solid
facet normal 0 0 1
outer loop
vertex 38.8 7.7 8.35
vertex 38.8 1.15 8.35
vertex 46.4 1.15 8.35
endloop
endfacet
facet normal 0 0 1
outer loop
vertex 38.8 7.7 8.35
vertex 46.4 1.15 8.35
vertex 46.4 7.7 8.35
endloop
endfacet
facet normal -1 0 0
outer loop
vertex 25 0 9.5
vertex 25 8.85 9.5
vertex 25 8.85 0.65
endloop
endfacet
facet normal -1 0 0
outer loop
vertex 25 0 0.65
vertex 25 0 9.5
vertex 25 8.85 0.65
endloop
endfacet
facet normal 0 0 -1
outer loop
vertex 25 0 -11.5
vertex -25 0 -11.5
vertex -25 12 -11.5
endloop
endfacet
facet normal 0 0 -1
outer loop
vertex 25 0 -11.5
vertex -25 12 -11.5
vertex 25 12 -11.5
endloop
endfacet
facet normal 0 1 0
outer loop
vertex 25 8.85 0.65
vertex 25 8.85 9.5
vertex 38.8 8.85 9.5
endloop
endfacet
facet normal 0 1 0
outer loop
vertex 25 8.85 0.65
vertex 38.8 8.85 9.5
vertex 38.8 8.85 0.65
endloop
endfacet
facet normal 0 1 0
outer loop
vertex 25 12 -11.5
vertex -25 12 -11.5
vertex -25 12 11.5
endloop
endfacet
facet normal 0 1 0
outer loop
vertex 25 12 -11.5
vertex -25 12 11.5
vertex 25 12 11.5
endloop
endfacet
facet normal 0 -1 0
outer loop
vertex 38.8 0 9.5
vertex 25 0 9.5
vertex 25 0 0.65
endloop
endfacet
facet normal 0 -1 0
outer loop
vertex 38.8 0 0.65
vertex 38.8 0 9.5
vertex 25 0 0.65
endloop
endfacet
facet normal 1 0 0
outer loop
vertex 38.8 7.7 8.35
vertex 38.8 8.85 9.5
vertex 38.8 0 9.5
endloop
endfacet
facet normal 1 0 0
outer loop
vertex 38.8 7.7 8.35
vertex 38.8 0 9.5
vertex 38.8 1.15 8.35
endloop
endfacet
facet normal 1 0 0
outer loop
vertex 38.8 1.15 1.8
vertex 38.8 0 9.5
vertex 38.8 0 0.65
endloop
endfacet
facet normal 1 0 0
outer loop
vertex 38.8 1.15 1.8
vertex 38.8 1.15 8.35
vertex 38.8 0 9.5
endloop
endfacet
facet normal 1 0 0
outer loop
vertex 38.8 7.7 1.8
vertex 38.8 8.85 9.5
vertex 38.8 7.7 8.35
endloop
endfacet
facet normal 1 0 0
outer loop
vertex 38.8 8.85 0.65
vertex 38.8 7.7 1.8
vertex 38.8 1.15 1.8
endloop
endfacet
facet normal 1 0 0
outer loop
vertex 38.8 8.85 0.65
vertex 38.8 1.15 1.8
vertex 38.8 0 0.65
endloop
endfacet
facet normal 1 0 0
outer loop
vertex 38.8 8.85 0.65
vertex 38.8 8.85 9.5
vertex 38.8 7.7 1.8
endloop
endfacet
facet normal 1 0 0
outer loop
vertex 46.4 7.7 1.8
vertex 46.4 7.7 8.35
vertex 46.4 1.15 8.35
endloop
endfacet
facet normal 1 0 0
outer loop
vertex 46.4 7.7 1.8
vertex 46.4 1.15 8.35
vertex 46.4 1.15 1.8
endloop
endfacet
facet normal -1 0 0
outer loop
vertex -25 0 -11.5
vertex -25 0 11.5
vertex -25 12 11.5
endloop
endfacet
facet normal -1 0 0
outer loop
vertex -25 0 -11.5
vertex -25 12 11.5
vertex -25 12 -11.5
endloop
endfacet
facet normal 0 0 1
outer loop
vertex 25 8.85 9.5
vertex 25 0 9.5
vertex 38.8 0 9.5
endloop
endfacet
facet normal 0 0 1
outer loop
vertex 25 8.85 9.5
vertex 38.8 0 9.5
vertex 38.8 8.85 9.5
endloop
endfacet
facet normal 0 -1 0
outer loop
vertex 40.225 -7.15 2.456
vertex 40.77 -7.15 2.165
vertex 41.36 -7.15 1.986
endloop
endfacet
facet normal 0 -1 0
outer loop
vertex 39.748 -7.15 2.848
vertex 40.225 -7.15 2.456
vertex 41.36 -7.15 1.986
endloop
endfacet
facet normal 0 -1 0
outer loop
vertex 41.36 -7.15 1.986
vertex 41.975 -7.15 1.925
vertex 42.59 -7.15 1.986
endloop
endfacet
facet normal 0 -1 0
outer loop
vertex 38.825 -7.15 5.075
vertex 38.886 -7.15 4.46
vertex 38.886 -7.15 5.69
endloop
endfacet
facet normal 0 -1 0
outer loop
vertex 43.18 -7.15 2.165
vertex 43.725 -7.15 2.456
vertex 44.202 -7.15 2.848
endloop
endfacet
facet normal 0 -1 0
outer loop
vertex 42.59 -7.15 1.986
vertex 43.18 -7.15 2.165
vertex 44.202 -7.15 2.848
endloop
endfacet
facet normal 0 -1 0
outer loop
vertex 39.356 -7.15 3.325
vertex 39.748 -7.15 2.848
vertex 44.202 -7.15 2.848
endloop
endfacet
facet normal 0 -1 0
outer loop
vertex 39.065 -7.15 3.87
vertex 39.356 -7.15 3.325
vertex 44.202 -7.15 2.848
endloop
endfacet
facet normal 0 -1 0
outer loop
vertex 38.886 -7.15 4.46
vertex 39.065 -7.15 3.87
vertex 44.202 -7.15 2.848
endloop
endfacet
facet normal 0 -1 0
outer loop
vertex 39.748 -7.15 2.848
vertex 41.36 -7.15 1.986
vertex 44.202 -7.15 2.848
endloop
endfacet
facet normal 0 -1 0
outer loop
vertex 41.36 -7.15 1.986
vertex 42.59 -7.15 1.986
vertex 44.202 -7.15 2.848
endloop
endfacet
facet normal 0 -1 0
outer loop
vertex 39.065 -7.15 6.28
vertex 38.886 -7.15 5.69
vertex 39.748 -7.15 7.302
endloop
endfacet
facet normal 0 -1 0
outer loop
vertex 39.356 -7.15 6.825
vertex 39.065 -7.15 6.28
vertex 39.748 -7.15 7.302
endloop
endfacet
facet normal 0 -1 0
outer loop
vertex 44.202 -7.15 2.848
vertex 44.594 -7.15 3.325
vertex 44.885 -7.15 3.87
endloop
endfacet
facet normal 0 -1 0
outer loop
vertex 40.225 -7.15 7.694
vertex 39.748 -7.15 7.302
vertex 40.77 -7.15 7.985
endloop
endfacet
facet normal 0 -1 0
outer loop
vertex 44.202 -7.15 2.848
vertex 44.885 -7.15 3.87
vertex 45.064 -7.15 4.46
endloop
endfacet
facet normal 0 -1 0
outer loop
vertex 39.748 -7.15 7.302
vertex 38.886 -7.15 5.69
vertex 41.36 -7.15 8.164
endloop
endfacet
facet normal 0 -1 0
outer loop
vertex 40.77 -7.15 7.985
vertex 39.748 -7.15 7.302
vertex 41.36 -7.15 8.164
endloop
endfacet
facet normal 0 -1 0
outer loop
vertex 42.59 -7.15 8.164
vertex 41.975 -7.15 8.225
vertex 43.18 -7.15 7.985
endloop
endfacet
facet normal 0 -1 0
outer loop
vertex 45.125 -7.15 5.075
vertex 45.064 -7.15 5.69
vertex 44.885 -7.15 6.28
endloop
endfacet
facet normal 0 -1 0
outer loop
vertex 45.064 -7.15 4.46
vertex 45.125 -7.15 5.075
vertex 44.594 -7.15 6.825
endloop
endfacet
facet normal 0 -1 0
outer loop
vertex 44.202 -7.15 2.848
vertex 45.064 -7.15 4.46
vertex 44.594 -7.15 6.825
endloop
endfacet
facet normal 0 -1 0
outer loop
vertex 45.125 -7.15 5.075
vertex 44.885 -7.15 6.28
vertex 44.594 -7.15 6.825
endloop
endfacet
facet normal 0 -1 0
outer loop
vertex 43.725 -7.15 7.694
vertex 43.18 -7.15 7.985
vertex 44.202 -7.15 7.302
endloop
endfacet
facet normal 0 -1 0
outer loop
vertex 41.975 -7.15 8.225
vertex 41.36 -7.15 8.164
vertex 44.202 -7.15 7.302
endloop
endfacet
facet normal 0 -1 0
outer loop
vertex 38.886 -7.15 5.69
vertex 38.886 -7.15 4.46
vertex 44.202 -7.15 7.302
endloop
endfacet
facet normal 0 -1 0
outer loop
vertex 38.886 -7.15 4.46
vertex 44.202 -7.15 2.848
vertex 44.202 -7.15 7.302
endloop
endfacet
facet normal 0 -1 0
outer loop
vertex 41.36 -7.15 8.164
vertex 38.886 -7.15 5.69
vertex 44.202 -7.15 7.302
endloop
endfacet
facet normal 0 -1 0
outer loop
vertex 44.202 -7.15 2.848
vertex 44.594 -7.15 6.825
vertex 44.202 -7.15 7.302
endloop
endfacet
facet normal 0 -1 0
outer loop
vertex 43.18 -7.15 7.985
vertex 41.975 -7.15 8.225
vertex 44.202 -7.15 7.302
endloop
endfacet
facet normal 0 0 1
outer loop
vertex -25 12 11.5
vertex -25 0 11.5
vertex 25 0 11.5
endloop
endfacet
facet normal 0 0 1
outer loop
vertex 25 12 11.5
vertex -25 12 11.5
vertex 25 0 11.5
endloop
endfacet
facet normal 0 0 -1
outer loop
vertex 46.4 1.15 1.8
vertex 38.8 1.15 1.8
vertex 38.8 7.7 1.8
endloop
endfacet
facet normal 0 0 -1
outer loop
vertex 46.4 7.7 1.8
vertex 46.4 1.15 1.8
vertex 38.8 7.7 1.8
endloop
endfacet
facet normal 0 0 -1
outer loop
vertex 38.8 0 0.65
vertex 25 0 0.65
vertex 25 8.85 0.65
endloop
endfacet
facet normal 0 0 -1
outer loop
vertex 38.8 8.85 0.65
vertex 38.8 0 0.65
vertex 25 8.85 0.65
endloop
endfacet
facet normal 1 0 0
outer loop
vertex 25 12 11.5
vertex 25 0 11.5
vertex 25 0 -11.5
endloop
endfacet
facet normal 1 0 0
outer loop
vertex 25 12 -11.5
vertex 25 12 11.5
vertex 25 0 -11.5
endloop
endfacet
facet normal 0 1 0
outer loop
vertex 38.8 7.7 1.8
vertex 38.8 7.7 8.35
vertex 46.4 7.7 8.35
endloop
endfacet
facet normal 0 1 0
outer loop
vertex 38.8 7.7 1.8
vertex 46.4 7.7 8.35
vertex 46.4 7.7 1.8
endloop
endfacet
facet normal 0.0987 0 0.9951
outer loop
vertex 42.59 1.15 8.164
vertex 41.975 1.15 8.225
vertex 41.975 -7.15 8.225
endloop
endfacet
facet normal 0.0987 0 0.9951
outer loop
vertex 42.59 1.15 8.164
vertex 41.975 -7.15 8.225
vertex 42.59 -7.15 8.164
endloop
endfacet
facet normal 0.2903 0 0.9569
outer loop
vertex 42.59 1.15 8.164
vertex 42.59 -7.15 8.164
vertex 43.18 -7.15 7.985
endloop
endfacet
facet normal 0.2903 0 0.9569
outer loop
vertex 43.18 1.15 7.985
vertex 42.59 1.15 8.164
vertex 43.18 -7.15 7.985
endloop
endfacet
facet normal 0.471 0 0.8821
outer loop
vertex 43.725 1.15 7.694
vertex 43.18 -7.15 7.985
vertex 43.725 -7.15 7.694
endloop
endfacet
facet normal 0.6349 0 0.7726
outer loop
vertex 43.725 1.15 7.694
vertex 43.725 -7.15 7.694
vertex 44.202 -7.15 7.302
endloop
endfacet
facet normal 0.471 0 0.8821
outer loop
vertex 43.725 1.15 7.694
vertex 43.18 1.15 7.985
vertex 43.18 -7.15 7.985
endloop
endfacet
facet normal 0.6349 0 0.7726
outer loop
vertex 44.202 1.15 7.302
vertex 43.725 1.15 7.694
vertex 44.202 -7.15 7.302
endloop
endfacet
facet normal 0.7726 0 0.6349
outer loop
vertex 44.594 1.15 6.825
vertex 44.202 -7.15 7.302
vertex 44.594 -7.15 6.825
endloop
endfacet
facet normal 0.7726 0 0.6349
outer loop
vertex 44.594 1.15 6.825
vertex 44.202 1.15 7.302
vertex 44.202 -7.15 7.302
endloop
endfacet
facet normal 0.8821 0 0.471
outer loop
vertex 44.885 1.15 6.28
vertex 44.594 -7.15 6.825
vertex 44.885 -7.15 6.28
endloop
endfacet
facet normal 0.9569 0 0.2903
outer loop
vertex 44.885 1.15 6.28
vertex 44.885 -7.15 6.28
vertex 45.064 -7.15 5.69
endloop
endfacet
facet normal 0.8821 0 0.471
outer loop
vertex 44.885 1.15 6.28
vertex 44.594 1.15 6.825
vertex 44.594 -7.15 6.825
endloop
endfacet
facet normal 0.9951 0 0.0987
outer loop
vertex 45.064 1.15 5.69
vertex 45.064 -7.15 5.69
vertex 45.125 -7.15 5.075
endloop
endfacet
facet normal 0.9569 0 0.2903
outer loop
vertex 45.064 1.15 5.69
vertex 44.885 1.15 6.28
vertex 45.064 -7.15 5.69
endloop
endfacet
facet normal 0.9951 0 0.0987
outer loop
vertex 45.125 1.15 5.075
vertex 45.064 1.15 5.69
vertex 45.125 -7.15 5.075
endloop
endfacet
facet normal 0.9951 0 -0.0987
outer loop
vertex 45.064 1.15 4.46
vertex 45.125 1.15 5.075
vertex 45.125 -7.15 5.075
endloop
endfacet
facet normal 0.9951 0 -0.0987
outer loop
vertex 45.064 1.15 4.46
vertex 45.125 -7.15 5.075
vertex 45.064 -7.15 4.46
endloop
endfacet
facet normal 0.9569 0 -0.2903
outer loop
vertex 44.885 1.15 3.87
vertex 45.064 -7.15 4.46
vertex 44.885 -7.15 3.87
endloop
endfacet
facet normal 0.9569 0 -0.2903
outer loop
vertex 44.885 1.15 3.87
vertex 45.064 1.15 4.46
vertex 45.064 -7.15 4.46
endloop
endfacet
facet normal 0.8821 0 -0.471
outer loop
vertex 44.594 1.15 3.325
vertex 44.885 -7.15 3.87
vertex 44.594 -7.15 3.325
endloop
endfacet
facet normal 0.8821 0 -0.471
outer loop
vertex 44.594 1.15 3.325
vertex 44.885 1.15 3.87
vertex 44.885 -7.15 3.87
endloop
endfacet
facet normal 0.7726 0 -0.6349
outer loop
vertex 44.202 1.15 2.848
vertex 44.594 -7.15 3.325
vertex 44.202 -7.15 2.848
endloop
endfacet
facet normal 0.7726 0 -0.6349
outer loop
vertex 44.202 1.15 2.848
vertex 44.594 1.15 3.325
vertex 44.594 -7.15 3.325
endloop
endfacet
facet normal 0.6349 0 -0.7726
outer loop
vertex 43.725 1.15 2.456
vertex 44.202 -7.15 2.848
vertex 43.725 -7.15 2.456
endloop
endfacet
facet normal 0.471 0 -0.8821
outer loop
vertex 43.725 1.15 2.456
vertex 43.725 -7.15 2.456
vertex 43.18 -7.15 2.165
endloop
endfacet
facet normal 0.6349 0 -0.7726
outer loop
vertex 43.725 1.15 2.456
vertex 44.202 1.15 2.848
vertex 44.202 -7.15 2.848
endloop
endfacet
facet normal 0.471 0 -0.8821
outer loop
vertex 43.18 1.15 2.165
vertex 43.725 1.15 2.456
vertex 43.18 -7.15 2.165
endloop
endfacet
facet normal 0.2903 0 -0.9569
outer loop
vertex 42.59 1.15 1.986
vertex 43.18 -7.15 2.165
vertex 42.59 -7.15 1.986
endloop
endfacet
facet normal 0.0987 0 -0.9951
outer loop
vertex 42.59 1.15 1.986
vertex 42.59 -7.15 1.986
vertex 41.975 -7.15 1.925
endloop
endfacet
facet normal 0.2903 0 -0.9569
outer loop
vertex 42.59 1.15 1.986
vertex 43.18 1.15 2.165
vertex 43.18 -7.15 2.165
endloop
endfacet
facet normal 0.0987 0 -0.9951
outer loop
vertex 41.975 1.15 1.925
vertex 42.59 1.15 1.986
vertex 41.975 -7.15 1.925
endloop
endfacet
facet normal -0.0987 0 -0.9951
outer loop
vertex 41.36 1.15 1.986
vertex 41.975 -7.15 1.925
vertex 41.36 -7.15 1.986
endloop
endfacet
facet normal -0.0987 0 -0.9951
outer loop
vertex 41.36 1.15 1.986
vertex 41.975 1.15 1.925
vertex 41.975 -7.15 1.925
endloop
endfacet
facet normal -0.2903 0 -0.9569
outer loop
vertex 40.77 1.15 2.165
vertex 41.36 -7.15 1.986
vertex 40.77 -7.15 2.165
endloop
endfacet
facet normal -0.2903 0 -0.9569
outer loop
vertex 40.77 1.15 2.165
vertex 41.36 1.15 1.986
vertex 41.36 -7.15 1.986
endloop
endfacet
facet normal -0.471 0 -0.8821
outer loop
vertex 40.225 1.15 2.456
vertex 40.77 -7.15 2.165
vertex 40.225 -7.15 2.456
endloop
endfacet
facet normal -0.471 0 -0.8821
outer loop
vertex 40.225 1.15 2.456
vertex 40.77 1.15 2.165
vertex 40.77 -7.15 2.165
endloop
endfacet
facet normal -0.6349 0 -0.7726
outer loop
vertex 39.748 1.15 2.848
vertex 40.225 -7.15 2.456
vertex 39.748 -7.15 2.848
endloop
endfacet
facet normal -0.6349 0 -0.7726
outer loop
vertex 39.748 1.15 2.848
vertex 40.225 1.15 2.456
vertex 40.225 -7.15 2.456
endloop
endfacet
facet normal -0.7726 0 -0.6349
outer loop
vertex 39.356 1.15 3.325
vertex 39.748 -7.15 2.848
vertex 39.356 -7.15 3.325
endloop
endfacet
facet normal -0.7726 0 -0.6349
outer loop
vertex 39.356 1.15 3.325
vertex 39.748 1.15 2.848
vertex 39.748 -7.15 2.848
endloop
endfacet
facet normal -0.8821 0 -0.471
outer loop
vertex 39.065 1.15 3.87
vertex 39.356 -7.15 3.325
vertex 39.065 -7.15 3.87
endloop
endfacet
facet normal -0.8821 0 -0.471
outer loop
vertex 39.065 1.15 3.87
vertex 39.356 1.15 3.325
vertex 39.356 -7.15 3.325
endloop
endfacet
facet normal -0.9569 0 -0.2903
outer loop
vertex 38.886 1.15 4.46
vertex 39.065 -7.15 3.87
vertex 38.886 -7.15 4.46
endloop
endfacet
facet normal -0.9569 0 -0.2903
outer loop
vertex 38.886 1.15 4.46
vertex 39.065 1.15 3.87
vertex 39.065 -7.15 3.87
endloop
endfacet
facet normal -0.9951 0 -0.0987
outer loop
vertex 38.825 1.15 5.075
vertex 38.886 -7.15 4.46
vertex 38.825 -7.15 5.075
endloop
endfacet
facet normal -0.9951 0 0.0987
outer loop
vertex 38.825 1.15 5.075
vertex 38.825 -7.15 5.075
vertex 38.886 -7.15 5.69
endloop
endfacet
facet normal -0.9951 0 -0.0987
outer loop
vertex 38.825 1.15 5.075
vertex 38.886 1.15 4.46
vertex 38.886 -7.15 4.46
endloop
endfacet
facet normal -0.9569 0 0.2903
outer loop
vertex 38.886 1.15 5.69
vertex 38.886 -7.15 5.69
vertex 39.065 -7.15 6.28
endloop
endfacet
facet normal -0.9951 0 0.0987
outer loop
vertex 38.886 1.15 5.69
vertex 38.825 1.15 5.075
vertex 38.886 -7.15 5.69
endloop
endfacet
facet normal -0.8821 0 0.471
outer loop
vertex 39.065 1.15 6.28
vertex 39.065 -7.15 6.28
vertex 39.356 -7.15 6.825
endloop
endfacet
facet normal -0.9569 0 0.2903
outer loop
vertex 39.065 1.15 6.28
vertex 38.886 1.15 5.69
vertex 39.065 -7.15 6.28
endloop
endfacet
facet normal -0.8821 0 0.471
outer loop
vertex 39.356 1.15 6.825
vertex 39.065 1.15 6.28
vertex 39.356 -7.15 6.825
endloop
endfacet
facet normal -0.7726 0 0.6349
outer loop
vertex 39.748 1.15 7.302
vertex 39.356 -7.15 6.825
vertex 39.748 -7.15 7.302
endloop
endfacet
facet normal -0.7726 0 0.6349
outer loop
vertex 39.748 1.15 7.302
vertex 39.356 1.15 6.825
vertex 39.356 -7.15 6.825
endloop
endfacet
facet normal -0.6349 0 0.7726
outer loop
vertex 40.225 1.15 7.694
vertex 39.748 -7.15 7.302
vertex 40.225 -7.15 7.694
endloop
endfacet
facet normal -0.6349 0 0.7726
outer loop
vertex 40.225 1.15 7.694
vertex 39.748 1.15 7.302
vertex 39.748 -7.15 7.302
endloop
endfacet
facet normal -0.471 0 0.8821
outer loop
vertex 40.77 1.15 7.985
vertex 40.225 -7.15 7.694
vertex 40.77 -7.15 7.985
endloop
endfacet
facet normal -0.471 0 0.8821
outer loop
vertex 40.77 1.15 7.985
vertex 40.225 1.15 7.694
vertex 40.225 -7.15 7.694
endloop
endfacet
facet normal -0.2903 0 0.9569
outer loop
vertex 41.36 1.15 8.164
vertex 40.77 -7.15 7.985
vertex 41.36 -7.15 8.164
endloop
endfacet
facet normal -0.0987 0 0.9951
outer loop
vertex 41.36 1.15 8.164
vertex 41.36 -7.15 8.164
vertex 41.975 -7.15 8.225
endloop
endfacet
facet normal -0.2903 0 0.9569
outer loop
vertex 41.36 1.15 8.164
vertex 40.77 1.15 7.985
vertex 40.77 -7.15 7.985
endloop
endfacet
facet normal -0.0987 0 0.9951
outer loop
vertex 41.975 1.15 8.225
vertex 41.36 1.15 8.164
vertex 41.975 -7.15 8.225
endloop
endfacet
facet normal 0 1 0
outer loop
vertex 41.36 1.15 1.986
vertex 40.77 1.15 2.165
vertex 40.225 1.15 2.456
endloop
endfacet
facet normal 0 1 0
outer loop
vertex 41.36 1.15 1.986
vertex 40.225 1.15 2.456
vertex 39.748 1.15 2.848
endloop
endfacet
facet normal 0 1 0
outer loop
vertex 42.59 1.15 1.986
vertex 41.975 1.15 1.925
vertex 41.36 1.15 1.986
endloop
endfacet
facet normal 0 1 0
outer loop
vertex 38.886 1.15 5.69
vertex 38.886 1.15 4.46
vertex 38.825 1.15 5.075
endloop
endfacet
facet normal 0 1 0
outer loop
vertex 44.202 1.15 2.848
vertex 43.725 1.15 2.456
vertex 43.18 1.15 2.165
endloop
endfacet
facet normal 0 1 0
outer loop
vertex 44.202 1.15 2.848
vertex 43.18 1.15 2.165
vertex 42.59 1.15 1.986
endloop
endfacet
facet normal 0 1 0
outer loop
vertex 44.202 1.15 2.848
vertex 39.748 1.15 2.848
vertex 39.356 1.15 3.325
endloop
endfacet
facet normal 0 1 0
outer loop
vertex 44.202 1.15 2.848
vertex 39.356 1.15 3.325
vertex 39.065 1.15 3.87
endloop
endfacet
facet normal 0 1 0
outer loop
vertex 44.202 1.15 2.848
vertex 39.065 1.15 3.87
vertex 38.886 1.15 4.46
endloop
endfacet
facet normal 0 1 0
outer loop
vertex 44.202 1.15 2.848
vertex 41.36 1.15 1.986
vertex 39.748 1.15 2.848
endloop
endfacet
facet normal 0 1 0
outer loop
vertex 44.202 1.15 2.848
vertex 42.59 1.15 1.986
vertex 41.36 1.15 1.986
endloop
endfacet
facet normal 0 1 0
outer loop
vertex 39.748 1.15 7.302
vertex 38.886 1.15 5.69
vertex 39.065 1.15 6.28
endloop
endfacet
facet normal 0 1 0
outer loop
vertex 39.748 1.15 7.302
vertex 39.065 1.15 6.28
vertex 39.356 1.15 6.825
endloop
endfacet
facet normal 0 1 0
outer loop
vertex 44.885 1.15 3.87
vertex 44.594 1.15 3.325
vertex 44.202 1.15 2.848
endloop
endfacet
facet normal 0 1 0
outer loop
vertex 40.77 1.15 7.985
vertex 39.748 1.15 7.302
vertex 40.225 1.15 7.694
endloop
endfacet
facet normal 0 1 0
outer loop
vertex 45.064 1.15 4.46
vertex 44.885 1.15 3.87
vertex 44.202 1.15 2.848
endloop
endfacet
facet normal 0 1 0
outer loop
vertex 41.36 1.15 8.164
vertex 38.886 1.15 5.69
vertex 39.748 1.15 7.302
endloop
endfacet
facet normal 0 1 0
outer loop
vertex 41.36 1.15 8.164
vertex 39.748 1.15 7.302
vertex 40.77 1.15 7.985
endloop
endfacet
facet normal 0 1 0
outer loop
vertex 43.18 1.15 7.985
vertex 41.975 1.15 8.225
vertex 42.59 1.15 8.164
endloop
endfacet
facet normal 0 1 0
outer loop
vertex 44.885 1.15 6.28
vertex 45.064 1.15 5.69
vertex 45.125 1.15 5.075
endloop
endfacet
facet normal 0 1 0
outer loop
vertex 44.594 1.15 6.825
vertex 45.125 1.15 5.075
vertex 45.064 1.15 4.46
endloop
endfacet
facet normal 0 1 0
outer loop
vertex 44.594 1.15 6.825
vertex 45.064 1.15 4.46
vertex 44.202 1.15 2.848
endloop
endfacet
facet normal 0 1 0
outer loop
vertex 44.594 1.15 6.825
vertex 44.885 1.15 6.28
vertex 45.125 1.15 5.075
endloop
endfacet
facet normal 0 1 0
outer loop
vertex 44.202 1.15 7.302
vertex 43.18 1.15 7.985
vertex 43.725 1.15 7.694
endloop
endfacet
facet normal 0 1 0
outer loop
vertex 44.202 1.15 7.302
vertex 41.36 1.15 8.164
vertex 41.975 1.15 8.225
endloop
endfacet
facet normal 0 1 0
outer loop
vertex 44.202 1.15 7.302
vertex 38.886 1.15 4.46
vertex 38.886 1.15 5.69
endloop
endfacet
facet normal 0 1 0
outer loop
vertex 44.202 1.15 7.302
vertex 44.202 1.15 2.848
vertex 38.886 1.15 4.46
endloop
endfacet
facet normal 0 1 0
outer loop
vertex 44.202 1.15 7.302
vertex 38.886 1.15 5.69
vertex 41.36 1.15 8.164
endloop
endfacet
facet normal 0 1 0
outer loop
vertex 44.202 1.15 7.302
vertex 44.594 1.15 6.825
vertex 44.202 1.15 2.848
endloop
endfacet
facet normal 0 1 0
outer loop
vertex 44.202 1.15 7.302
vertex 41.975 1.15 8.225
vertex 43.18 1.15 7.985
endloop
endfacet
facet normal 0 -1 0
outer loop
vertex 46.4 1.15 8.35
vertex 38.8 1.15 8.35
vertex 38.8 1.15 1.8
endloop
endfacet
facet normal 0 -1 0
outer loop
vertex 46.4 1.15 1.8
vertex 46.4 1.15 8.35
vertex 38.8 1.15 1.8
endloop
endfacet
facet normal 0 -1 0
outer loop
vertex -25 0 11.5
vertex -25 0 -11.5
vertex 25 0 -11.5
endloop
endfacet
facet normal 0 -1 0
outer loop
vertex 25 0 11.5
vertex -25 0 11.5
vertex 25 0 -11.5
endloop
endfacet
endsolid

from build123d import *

# Parameters (mm, degrees)
SKETCH1_W           = 50
SKETCH1_H           = 23
BOSS_EXTRUDE2_DEPTH = 12
SKETCH2_W           = 8.85
SKETCH2_H           = 8.85
BOSS_EXTRUDE3_DEPTH = 21.4
SKETCH4_W           = 8.85
SKETCH4_H           = 8.85
SKETCH4_W_2         = 6.55
SKETCH4_H_2         = 6.55
CUT_EXTRUDE1_DEPTH  = 7.6
SKETCH3_R           = 3.15
BOSS_EXTRUDE4_DEPTH = 8.3


with BuildPart() as part:
    # Sketch1 → Boss-Extrude2 (new body)
    with BuildSketch(Plane(origin=(0, 0, 0), x_dir=(1, 0, 0), z_dir=(0, 1, 0))):
        Rectangle(SKETCH1_W, SKETCH1_H)
    extrude(amount=BOSS_EXTRUDE2_DEPTH)


with BuildPart() as body_2:
    # Sketch2 → Boss-Extrude3 (new body)
    with BuildSketch(Plane(origin=(25, 0, 0), x_dir=(0, 0, -1), z_dir=(1, 0, 0))):
        with Locations((-5.075, 4.425)):
            Rectangle(SKETCH2_W, SKETCH2_H)
    extrude(amount=BOSS_EXTRUDE3_DEPTH)

    # Sketch4 → Cut-Extrude1 (cut)
    with BuildSketch(Plane(origin=(46.4, 0, 0), x_dir=(0, 0, -1), z_dir=(1, 0, 0))):
        with Locations((-5.075, 4.425)):
            Rectangle(SKETCH4_W, SKETCH4_H)
        with Locations((-5.075, 4.425)):
            Rectangle(SKETCH4_W_2, SKETCH4_H_2, mode=Mode.SUBTRACT)
    extrude(amount=-CUT_EXTRUDE1_DEPTH, mode=Mode.SUBTRACT)


with BuildPart() as body_3:
    # Sketch3 → Boss-Extrude4 (new body)
    with BuildSketch(Plane(origin=(0, 1.15, 0), x_dir=(1, 0, 0), z_dir=(0, 1, 0))):
        with Locations(Location((41.975, -5.075, 0), (0, 0, 270))):
            Circle(SKETCH3_R)
    extrude(amount=-BOSS_EXTRUDE4_DEPTH)


solid = Compound([part.part, body_2.part, body_3.part])
